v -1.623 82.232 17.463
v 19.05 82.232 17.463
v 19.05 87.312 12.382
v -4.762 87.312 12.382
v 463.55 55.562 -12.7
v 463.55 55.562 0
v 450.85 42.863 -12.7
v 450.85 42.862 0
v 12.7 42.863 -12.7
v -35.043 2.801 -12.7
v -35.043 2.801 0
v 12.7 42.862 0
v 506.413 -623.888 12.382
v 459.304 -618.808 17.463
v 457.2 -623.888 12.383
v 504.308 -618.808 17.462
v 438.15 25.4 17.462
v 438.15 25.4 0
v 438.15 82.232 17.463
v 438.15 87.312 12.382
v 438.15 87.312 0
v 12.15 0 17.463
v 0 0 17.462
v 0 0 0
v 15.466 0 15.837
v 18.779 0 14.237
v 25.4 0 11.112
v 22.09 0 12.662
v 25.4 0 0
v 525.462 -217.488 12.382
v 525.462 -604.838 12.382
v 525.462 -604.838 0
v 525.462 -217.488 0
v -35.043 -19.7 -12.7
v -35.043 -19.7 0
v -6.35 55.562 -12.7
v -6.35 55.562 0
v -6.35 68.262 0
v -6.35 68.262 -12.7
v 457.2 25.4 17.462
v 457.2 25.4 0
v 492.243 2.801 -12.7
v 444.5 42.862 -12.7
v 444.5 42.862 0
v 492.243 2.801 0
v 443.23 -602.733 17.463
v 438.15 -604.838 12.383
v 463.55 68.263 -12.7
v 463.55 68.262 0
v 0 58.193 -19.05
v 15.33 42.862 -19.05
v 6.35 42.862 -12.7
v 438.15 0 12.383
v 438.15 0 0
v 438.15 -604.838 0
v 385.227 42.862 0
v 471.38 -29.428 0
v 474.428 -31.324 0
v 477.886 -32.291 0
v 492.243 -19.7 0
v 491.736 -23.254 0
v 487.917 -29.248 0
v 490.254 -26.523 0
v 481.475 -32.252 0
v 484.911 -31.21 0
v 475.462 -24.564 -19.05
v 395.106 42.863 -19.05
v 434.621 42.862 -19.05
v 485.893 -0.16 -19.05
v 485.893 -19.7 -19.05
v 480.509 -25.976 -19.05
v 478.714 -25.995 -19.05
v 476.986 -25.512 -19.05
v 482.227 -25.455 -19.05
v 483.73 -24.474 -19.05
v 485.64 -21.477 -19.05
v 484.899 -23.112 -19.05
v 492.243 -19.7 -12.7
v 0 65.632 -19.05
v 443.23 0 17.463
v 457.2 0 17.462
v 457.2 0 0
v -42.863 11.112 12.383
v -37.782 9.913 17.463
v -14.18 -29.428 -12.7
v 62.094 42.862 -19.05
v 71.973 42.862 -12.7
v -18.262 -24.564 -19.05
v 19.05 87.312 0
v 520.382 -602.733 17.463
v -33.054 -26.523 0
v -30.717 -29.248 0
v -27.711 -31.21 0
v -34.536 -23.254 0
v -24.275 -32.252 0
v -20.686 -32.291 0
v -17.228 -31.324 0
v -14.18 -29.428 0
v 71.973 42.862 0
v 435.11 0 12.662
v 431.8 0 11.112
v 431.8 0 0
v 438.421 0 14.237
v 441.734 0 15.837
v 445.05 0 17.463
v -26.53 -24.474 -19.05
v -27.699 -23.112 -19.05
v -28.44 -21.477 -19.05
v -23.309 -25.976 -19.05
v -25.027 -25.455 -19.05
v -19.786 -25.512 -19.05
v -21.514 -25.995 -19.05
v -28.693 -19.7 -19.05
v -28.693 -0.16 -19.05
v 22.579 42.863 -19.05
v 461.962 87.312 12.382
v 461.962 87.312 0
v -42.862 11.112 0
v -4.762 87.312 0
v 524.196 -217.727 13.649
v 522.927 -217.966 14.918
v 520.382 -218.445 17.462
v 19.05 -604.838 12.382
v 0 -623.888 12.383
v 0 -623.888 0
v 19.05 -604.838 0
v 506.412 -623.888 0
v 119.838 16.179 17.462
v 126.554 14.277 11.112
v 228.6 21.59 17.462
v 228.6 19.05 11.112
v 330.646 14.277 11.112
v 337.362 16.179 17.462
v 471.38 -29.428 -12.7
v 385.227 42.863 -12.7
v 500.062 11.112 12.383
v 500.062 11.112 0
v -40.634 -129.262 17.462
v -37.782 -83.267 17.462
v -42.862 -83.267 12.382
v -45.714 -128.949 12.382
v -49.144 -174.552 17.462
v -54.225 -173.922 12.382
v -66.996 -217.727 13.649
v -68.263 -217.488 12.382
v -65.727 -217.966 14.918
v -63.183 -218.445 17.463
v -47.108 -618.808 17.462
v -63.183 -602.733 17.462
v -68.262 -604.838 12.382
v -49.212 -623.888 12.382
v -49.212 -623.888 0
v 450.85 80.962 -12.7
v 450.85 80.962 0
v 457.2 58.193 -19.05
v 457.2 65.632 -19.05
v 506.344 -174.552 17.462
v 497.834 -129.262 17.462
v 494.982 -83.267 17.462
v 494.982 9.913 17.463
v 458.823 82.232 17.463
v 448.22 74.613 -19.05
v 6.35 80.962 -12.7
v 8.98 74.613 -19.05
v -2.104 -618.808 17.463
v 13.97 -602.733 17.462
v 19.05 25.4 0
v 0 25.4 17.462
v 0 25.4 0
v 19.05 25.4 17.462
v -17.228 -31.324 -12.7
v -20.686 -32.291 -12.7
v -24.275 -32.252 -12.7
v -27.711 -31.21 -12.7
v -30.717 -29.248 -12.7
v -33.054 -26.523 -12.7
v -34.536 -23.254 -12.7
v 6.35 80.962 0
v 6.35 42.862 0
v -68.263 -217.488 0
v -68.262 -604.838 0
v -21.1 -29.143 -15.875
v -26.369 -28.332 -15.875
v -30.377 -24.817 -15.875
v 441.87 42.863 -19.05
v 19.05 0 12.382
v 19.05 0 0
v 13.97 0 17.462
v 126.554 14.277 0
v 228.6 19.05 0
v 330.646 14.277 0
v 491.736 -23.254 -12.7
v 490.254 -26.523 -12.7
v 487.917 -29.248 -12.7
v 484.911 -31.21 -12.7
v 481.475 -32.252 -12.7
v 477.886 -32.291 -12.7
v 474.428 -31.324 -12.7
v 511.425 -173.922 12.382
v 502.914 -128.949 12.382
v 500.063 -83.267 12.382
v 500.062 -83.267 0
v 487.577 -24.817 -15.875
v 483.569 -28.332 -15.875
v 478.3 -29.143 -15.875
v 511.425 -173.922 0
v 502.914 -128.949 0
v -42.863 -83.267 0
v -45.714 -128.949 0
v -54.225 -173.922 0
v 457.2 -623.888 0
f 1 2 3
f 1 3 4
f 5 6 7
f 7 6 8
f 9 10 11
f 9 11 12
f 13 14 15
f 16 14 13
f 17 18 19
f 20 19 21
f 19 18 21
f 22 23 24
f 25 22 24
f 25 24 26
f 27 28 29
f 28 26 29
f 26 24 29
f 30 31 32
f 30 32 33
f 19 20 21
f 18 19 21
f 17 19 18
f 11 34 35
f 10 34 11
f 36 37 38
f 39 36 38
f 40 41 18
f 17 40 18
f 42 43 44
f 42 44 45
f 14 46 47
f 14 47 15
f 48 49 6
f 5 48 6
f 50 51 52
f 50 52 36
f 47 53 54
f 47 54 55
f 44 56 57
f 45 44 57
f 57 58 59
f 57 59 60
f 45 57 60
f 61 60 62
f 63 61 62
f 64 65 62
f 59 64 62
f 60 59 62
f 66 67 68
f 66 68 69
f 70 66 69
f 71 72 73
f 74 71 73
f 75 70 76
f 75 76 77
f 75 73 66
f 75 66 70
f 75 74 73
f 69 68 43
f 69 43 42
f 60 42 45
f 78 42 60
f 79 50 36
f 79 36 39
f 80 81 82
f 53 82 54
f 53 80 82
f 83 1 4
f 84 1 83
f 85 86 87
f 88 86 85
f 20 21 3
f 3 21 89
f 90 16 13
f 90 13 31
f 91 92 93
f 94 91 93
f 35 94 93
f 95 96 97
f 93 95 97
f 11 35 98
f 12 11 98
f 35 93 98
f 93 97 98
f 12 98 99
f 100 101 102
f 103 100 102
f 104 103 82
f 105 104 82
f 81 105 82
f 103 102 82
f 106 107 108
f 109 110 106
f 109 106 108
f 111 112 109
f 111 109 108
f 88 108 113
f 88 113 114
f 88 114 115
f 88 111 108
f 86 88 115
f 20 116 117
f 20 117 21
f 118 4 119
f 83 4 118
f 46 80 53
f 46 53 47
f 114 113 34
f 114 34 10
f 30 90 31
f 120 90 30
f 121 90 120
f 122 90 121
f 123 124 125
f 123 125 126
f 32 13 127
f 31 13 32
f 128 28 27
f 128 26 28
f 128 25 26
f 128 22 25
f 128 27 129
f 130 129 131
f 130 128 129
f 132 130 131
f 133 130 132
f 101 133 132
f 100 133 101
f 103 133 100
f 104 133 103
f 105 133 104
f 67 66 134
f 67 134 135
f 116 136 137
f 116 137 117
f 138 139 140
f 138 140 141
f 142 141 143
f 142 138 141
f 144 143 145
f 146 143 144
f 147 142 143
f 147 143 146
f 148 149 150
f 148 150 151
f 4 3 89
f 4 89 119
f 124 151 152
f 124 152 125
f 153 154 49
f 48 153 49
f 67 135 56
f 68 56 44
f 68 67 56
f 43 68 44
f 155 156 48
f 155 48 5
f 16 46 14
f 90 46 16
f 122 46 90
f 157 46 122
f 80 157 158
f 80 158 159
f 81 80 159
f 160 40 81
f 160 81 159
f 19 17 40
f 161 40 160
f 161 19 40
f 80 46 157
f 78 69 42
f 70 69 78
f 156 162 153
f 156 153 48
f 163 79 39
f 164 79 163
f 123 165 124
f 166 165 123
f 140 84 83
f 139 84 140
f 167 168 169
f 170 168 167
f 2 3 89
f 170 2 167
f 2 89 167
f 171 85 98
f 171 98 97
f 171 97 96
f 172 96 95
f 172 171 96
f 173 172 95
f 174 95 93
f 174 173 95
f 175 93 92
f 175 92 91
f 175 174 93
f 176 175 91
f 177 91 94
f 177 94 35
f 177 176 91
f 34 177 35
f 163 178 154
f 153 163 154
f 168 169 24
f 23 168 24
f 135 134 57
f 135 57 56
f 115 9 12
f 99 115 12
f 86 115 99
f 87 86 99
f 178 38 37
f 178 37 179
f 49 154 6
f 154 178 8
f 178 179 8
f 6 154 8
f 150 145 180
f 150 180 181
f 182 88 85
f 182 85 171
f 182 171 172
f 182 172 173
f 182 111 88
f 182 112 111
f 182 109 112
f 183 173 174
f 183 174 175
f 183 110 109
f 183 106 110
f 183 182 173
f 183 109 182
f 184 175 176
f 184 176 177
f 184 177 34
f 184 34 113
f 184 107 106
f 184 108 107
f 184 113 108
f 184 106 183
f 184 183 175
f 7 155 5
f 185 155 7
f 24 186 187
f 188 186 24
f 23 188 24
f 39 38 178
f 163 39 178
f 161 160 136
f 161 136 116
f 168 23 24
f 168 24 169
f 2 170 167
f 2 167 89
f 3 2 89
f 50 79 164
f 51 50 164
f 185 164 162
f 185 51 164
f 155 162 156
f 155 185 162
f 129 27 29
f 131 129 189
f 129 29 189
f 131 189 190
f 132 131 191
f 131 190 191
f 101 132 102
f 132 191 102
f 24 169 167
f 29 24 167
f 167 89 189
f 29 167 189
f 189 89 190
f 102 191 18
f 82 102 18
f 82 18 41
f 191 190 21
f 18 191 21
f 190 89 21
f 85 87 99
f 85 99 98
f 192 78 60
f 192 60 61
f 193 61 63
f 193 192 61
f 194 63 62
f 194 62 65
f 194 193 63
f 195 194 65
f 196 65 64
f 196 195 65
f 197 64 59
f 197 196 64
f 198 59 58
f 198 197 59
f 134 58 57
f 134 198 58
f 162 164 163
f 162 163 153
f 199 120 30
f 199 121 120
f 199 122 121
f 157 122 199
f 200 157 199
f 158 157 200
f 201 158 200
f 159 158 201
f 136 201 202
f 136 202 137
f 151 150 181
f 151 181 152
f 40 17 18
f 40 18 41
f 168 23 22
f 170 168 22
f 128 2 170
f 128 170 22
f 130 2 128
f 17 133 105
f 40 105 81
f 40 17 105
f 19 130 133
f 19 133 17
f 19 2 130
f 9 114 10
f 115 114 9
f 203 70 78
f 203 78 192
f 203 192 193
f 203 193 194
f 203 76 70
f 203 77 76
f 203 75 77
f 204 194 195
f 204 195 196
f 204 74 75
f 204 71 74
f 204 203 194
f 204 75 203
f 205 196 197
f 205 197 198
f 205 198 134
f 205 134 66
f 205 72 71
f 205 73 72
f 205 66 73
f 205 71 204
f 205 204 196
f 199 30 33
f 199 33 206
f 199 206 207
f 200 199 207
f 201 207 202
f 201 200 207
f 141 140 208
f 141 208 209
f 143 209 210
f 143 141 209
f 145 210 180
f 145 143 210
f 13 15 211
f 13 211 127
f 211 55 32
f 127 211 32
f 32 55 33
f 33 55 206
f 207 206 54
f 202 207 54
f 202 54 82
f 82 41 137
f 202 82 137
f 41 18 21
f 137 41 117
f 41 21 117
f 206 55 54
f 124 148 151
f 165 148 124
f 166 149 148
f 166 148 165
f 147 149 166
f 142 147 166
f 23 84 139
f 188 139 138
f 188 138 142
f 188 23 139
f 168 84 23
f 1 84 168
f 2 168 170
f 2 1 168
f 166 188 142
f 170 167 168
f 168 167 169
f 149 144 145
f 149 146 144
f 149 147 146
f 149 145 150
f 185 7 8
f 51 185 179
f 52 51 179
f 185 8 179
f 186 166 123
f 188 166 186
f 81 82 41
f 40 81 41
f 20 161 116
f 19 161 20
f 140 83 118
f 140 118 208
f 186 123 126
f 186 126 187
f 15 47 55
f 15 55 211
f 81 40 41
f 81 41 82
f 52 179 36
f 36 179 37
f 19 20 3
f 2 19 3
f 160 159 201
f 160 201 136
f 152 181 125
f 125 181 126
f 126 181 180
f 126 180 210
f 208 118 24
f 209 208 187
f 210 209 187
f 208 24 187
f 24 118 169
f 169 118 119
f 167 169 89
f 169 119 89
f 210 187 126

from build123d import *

# Parameters (mm, degrees)
F1_DEPTH   = 17.4625
F2_SIZE2   = 2.54
F2_SIZE    = 6.35
F4_DEPTH   = 17.4625
F5_SIZE    = 5.08
F5_2_SIZE  = 5.08
F7_DEPTH   = 19.05
F9_DEPTH   = 19.05
F10_SIZE   = 6.35
F10_2_SIZE = 6.35


with BuildPart() as f1:
    # F0 (on Top) → F1 (new body)
    with BuildSketch(Plane.XY):
        with BuildLine():
            Line((0, 25.4), (0, 0))
            Line((0, 0), (25.4, 0))
            ThreePointArc((25.4, 0), (228.6, 19.05), (431.8, 0))
            Line((431.8, 0), (457.2, 0))
            Line((457.2, 0), (457.2, 25.4))
            Line((457.2, 25.4), (438.15, 25.4))
            Line((438.15, 25.4), (438.15, 87.3125))
            Line((438.15, 87.3125), (19.05, 87.3125))
            Line((19.05, 87.3125), (19.05, 25.4))
            Line((19.05, 25.4), (0, 25.4))
        make_face()
    extrude(amount=F1_DEPTH)

    # F2
    f2_edges = [f1.edges().sort_by_distance(p)[0] for p in [
        (228.6, 19.05, 17.4625),
    ]]
    chamfer(f2_edges, length=F2_SIZE, length2=F2_SIZE2)

    # F5
    f5_edges = [f1.edges().sort_by_distance(p)[0] for p in [
        (228.6, 87.3125, 17.4625),
    ]]
    chamfer(f5_edges, length=F5_SIZE)


with BuildPart() as f4:
    # F3 (on face) → F4 (new body)
    with BuildSketch(Plane.XY.offset(17.4625)):
        with BuildLine():
            Line((19.05, 87.3125), (-4.7625, 87.3125))
            Line((-4.7625, 87.3125), (-42.8625, 11.1125))
            Line((-42.8625, 11.1125), (-42.8625, -83.26666))
            ThreePointArc((-42.8625, -83.26666), (-49.268356, -151.568186), (-68.2625, -217.4875))
            Line((-68.2625, -217.4875), (-68.2625, -604.8375))
            Line((-68.2625, -604.8375), (-49.2125, -623.8875))
            Line((-49.2125, -623.8875), (0, -623.8875))
            Line((0, -623.8875), (19.05, -604.8375))
            Line((19.05, -604.8375), (19.05, 0))
            Line((19.05, 0), (0, 0))
            Line((0, 0), (0, 25.4))
            Line((0, 25.4), (19.05, 25.4))
            Line((19.05, 25.4), (19.05, 87.3125))
        make_face()
        with BuildLine():
            Line((457.2, 25.4), (457.2, 0))
            Line((457.2, 0), (438.15, 0))
            Line((438.15, 0), (438.15, -604.8375))
            Line((438.15, -604.8375), (457.2, -623.8875))
            Line((457.2, -623.8875), (506.4125, -623.8875))
            Line((506.4125, -623.8875), (525.4625, -604.8375))
            Line((525.4625, -604.8375), (525.4625, -217.4875))
            ThreePointArc((525.4625, -217.4875), (506.468356, -151.568186), (500.0625, -83.26666))
            Line((500.0625, -83.26666), (500.0625, 11.1125))
            Line((500.0625, 11.1125), (461.9625, 87.3125))
            Line((461.9625, 87.3125), (438.15, 87.3125))
            Line((438.15, 87.3125), (438.15, 25.4))
            Line((438.15, 25.4), (457.2, 25.4))
        make_face()
    extrude(amount=-F4_DEPTH)

    # F5#2
    f5_2_edges = [f4.edges().sort_by_distance(p)[0] for p in [
        (7.14375, 87.3125, 17.4625),
        (-23.8125, 49.2125, 17.4625),
        (-42.8625, -36.07708, 17.4625),
        (-68.2625, -411.1625, 17.4625),
        (-58.7375, -614.3625, 17.4625),
        (-24.60625, -623.8875, 17.4625),
        (9.525, -614.3625, 17.4625),
        (19.05, -302.41875, 17.4625),
        (450.05625, 87.3125, 17.4625),
        (481.0125, 49.2125, 17.4625),
        (500.0625, -36.07708, 17.4625),
        (506.468356, -151.568186, 17.4625),
        (525.4625, -411.1625, 17.4625),
        (515.9375, -614.3625, 17.4625),
        (481.80625, -623.8875, 17.4625),
        (447.675, -614.3625, 17.4625),
        (438.15, -302.41875, 17.4625),
    ]]
    chamfer(f5_2_edges, length=F5_2_SIZE)


with BuildPart() as f7:
    # F6 (on face) → F7 (new body)
    with BuildSketch(Plane(origin=(0, 0, 0), x_dir=(1, 0, 0), z_dir=(0, 0, -1))):
        Polygon((6.35, -80.9625), (450.85, -80.9625), (463.55, -68.2625), (463.55, -55.5625), (450.85, -42.8625), (6.35, -42.8625), (-6.35, -55.5625), (-6.35, -68.2625), align=None)
    extrude(amount=F7_DEPTH)

    # F10#2
    f10_2_edges = [f7.edges().sort_by_distance(p)[0] for p in [
        (-6.35, 61.9125, -19.05),
        (0, 74.6125, -19.05),
        (228.6, 80.9625, -19.05),
        (457.2, 74.6125, -19.05),
        (463.55, 61.9125, -19.05),
        (457.2, 49.2125, -19.05),
        (0, 49.2125, -19.05),
    ]]
    chamfer(f10_2_edges, length=F10_2_SIZE)


with BuildPart() as f9:
    # F8 (on face) → F9 (new body)
    with BuildSketch(Plane(origin=(0, 0, -19.05), x_dir=(1, 0, 0), z_dir=(0, 0, -1))):
        with BuildLine():
            Line((471.379928, 29.428456), (385.226922, -42.8625))
            Line((385.226922, -42.8625), (444.5, -42.8625))
            Line((444.5, -42.8625), (492.243331, -2.801089))
            Line((492.243331, -2.801089), (492.243331, 19.699691))
            ThreePointArc((492.243331, 19.699691), (484.910583, 31.2098), (471.379928, 29.428456))
        make_face()
        with BuildLine():
            Line((-35.043331, 19.699691), (-35.043331, -2.801089))
            Line((-35.043331, -2.801089), (12.7, -42.8625))
            Line((12.7, -42.8625), (71.973078, -42.8625))
            Line((71.973078, -42.8625), (-14.179928, 29.428456))
            ThreePointArc((-14.179928, 29.428456), (-27.710583, 31.2098), (-35.043331, 19.699691))
        make_face()
    extrude(amount=-F9_DEPTH)

    # F10
    f10_edges = [f9.edges().sort_by_distance(p)[0] for p in [
        (468.371665, 22.831794, -19.05),
        (492.243331, -8.449301, -19.05),
        (484.910583, -31.2098, -19.05),
        (28.896575, 6.717022, -19.05),
        (-27.710583, -31.2098, -19.05),
        (-11.171665, 22.831794, -19.05),
    ]]
    chamfer(f10_edges, length=F10_SIZE)


solid = Compound([f1.part, f4.part, f7.part, f9.part])
